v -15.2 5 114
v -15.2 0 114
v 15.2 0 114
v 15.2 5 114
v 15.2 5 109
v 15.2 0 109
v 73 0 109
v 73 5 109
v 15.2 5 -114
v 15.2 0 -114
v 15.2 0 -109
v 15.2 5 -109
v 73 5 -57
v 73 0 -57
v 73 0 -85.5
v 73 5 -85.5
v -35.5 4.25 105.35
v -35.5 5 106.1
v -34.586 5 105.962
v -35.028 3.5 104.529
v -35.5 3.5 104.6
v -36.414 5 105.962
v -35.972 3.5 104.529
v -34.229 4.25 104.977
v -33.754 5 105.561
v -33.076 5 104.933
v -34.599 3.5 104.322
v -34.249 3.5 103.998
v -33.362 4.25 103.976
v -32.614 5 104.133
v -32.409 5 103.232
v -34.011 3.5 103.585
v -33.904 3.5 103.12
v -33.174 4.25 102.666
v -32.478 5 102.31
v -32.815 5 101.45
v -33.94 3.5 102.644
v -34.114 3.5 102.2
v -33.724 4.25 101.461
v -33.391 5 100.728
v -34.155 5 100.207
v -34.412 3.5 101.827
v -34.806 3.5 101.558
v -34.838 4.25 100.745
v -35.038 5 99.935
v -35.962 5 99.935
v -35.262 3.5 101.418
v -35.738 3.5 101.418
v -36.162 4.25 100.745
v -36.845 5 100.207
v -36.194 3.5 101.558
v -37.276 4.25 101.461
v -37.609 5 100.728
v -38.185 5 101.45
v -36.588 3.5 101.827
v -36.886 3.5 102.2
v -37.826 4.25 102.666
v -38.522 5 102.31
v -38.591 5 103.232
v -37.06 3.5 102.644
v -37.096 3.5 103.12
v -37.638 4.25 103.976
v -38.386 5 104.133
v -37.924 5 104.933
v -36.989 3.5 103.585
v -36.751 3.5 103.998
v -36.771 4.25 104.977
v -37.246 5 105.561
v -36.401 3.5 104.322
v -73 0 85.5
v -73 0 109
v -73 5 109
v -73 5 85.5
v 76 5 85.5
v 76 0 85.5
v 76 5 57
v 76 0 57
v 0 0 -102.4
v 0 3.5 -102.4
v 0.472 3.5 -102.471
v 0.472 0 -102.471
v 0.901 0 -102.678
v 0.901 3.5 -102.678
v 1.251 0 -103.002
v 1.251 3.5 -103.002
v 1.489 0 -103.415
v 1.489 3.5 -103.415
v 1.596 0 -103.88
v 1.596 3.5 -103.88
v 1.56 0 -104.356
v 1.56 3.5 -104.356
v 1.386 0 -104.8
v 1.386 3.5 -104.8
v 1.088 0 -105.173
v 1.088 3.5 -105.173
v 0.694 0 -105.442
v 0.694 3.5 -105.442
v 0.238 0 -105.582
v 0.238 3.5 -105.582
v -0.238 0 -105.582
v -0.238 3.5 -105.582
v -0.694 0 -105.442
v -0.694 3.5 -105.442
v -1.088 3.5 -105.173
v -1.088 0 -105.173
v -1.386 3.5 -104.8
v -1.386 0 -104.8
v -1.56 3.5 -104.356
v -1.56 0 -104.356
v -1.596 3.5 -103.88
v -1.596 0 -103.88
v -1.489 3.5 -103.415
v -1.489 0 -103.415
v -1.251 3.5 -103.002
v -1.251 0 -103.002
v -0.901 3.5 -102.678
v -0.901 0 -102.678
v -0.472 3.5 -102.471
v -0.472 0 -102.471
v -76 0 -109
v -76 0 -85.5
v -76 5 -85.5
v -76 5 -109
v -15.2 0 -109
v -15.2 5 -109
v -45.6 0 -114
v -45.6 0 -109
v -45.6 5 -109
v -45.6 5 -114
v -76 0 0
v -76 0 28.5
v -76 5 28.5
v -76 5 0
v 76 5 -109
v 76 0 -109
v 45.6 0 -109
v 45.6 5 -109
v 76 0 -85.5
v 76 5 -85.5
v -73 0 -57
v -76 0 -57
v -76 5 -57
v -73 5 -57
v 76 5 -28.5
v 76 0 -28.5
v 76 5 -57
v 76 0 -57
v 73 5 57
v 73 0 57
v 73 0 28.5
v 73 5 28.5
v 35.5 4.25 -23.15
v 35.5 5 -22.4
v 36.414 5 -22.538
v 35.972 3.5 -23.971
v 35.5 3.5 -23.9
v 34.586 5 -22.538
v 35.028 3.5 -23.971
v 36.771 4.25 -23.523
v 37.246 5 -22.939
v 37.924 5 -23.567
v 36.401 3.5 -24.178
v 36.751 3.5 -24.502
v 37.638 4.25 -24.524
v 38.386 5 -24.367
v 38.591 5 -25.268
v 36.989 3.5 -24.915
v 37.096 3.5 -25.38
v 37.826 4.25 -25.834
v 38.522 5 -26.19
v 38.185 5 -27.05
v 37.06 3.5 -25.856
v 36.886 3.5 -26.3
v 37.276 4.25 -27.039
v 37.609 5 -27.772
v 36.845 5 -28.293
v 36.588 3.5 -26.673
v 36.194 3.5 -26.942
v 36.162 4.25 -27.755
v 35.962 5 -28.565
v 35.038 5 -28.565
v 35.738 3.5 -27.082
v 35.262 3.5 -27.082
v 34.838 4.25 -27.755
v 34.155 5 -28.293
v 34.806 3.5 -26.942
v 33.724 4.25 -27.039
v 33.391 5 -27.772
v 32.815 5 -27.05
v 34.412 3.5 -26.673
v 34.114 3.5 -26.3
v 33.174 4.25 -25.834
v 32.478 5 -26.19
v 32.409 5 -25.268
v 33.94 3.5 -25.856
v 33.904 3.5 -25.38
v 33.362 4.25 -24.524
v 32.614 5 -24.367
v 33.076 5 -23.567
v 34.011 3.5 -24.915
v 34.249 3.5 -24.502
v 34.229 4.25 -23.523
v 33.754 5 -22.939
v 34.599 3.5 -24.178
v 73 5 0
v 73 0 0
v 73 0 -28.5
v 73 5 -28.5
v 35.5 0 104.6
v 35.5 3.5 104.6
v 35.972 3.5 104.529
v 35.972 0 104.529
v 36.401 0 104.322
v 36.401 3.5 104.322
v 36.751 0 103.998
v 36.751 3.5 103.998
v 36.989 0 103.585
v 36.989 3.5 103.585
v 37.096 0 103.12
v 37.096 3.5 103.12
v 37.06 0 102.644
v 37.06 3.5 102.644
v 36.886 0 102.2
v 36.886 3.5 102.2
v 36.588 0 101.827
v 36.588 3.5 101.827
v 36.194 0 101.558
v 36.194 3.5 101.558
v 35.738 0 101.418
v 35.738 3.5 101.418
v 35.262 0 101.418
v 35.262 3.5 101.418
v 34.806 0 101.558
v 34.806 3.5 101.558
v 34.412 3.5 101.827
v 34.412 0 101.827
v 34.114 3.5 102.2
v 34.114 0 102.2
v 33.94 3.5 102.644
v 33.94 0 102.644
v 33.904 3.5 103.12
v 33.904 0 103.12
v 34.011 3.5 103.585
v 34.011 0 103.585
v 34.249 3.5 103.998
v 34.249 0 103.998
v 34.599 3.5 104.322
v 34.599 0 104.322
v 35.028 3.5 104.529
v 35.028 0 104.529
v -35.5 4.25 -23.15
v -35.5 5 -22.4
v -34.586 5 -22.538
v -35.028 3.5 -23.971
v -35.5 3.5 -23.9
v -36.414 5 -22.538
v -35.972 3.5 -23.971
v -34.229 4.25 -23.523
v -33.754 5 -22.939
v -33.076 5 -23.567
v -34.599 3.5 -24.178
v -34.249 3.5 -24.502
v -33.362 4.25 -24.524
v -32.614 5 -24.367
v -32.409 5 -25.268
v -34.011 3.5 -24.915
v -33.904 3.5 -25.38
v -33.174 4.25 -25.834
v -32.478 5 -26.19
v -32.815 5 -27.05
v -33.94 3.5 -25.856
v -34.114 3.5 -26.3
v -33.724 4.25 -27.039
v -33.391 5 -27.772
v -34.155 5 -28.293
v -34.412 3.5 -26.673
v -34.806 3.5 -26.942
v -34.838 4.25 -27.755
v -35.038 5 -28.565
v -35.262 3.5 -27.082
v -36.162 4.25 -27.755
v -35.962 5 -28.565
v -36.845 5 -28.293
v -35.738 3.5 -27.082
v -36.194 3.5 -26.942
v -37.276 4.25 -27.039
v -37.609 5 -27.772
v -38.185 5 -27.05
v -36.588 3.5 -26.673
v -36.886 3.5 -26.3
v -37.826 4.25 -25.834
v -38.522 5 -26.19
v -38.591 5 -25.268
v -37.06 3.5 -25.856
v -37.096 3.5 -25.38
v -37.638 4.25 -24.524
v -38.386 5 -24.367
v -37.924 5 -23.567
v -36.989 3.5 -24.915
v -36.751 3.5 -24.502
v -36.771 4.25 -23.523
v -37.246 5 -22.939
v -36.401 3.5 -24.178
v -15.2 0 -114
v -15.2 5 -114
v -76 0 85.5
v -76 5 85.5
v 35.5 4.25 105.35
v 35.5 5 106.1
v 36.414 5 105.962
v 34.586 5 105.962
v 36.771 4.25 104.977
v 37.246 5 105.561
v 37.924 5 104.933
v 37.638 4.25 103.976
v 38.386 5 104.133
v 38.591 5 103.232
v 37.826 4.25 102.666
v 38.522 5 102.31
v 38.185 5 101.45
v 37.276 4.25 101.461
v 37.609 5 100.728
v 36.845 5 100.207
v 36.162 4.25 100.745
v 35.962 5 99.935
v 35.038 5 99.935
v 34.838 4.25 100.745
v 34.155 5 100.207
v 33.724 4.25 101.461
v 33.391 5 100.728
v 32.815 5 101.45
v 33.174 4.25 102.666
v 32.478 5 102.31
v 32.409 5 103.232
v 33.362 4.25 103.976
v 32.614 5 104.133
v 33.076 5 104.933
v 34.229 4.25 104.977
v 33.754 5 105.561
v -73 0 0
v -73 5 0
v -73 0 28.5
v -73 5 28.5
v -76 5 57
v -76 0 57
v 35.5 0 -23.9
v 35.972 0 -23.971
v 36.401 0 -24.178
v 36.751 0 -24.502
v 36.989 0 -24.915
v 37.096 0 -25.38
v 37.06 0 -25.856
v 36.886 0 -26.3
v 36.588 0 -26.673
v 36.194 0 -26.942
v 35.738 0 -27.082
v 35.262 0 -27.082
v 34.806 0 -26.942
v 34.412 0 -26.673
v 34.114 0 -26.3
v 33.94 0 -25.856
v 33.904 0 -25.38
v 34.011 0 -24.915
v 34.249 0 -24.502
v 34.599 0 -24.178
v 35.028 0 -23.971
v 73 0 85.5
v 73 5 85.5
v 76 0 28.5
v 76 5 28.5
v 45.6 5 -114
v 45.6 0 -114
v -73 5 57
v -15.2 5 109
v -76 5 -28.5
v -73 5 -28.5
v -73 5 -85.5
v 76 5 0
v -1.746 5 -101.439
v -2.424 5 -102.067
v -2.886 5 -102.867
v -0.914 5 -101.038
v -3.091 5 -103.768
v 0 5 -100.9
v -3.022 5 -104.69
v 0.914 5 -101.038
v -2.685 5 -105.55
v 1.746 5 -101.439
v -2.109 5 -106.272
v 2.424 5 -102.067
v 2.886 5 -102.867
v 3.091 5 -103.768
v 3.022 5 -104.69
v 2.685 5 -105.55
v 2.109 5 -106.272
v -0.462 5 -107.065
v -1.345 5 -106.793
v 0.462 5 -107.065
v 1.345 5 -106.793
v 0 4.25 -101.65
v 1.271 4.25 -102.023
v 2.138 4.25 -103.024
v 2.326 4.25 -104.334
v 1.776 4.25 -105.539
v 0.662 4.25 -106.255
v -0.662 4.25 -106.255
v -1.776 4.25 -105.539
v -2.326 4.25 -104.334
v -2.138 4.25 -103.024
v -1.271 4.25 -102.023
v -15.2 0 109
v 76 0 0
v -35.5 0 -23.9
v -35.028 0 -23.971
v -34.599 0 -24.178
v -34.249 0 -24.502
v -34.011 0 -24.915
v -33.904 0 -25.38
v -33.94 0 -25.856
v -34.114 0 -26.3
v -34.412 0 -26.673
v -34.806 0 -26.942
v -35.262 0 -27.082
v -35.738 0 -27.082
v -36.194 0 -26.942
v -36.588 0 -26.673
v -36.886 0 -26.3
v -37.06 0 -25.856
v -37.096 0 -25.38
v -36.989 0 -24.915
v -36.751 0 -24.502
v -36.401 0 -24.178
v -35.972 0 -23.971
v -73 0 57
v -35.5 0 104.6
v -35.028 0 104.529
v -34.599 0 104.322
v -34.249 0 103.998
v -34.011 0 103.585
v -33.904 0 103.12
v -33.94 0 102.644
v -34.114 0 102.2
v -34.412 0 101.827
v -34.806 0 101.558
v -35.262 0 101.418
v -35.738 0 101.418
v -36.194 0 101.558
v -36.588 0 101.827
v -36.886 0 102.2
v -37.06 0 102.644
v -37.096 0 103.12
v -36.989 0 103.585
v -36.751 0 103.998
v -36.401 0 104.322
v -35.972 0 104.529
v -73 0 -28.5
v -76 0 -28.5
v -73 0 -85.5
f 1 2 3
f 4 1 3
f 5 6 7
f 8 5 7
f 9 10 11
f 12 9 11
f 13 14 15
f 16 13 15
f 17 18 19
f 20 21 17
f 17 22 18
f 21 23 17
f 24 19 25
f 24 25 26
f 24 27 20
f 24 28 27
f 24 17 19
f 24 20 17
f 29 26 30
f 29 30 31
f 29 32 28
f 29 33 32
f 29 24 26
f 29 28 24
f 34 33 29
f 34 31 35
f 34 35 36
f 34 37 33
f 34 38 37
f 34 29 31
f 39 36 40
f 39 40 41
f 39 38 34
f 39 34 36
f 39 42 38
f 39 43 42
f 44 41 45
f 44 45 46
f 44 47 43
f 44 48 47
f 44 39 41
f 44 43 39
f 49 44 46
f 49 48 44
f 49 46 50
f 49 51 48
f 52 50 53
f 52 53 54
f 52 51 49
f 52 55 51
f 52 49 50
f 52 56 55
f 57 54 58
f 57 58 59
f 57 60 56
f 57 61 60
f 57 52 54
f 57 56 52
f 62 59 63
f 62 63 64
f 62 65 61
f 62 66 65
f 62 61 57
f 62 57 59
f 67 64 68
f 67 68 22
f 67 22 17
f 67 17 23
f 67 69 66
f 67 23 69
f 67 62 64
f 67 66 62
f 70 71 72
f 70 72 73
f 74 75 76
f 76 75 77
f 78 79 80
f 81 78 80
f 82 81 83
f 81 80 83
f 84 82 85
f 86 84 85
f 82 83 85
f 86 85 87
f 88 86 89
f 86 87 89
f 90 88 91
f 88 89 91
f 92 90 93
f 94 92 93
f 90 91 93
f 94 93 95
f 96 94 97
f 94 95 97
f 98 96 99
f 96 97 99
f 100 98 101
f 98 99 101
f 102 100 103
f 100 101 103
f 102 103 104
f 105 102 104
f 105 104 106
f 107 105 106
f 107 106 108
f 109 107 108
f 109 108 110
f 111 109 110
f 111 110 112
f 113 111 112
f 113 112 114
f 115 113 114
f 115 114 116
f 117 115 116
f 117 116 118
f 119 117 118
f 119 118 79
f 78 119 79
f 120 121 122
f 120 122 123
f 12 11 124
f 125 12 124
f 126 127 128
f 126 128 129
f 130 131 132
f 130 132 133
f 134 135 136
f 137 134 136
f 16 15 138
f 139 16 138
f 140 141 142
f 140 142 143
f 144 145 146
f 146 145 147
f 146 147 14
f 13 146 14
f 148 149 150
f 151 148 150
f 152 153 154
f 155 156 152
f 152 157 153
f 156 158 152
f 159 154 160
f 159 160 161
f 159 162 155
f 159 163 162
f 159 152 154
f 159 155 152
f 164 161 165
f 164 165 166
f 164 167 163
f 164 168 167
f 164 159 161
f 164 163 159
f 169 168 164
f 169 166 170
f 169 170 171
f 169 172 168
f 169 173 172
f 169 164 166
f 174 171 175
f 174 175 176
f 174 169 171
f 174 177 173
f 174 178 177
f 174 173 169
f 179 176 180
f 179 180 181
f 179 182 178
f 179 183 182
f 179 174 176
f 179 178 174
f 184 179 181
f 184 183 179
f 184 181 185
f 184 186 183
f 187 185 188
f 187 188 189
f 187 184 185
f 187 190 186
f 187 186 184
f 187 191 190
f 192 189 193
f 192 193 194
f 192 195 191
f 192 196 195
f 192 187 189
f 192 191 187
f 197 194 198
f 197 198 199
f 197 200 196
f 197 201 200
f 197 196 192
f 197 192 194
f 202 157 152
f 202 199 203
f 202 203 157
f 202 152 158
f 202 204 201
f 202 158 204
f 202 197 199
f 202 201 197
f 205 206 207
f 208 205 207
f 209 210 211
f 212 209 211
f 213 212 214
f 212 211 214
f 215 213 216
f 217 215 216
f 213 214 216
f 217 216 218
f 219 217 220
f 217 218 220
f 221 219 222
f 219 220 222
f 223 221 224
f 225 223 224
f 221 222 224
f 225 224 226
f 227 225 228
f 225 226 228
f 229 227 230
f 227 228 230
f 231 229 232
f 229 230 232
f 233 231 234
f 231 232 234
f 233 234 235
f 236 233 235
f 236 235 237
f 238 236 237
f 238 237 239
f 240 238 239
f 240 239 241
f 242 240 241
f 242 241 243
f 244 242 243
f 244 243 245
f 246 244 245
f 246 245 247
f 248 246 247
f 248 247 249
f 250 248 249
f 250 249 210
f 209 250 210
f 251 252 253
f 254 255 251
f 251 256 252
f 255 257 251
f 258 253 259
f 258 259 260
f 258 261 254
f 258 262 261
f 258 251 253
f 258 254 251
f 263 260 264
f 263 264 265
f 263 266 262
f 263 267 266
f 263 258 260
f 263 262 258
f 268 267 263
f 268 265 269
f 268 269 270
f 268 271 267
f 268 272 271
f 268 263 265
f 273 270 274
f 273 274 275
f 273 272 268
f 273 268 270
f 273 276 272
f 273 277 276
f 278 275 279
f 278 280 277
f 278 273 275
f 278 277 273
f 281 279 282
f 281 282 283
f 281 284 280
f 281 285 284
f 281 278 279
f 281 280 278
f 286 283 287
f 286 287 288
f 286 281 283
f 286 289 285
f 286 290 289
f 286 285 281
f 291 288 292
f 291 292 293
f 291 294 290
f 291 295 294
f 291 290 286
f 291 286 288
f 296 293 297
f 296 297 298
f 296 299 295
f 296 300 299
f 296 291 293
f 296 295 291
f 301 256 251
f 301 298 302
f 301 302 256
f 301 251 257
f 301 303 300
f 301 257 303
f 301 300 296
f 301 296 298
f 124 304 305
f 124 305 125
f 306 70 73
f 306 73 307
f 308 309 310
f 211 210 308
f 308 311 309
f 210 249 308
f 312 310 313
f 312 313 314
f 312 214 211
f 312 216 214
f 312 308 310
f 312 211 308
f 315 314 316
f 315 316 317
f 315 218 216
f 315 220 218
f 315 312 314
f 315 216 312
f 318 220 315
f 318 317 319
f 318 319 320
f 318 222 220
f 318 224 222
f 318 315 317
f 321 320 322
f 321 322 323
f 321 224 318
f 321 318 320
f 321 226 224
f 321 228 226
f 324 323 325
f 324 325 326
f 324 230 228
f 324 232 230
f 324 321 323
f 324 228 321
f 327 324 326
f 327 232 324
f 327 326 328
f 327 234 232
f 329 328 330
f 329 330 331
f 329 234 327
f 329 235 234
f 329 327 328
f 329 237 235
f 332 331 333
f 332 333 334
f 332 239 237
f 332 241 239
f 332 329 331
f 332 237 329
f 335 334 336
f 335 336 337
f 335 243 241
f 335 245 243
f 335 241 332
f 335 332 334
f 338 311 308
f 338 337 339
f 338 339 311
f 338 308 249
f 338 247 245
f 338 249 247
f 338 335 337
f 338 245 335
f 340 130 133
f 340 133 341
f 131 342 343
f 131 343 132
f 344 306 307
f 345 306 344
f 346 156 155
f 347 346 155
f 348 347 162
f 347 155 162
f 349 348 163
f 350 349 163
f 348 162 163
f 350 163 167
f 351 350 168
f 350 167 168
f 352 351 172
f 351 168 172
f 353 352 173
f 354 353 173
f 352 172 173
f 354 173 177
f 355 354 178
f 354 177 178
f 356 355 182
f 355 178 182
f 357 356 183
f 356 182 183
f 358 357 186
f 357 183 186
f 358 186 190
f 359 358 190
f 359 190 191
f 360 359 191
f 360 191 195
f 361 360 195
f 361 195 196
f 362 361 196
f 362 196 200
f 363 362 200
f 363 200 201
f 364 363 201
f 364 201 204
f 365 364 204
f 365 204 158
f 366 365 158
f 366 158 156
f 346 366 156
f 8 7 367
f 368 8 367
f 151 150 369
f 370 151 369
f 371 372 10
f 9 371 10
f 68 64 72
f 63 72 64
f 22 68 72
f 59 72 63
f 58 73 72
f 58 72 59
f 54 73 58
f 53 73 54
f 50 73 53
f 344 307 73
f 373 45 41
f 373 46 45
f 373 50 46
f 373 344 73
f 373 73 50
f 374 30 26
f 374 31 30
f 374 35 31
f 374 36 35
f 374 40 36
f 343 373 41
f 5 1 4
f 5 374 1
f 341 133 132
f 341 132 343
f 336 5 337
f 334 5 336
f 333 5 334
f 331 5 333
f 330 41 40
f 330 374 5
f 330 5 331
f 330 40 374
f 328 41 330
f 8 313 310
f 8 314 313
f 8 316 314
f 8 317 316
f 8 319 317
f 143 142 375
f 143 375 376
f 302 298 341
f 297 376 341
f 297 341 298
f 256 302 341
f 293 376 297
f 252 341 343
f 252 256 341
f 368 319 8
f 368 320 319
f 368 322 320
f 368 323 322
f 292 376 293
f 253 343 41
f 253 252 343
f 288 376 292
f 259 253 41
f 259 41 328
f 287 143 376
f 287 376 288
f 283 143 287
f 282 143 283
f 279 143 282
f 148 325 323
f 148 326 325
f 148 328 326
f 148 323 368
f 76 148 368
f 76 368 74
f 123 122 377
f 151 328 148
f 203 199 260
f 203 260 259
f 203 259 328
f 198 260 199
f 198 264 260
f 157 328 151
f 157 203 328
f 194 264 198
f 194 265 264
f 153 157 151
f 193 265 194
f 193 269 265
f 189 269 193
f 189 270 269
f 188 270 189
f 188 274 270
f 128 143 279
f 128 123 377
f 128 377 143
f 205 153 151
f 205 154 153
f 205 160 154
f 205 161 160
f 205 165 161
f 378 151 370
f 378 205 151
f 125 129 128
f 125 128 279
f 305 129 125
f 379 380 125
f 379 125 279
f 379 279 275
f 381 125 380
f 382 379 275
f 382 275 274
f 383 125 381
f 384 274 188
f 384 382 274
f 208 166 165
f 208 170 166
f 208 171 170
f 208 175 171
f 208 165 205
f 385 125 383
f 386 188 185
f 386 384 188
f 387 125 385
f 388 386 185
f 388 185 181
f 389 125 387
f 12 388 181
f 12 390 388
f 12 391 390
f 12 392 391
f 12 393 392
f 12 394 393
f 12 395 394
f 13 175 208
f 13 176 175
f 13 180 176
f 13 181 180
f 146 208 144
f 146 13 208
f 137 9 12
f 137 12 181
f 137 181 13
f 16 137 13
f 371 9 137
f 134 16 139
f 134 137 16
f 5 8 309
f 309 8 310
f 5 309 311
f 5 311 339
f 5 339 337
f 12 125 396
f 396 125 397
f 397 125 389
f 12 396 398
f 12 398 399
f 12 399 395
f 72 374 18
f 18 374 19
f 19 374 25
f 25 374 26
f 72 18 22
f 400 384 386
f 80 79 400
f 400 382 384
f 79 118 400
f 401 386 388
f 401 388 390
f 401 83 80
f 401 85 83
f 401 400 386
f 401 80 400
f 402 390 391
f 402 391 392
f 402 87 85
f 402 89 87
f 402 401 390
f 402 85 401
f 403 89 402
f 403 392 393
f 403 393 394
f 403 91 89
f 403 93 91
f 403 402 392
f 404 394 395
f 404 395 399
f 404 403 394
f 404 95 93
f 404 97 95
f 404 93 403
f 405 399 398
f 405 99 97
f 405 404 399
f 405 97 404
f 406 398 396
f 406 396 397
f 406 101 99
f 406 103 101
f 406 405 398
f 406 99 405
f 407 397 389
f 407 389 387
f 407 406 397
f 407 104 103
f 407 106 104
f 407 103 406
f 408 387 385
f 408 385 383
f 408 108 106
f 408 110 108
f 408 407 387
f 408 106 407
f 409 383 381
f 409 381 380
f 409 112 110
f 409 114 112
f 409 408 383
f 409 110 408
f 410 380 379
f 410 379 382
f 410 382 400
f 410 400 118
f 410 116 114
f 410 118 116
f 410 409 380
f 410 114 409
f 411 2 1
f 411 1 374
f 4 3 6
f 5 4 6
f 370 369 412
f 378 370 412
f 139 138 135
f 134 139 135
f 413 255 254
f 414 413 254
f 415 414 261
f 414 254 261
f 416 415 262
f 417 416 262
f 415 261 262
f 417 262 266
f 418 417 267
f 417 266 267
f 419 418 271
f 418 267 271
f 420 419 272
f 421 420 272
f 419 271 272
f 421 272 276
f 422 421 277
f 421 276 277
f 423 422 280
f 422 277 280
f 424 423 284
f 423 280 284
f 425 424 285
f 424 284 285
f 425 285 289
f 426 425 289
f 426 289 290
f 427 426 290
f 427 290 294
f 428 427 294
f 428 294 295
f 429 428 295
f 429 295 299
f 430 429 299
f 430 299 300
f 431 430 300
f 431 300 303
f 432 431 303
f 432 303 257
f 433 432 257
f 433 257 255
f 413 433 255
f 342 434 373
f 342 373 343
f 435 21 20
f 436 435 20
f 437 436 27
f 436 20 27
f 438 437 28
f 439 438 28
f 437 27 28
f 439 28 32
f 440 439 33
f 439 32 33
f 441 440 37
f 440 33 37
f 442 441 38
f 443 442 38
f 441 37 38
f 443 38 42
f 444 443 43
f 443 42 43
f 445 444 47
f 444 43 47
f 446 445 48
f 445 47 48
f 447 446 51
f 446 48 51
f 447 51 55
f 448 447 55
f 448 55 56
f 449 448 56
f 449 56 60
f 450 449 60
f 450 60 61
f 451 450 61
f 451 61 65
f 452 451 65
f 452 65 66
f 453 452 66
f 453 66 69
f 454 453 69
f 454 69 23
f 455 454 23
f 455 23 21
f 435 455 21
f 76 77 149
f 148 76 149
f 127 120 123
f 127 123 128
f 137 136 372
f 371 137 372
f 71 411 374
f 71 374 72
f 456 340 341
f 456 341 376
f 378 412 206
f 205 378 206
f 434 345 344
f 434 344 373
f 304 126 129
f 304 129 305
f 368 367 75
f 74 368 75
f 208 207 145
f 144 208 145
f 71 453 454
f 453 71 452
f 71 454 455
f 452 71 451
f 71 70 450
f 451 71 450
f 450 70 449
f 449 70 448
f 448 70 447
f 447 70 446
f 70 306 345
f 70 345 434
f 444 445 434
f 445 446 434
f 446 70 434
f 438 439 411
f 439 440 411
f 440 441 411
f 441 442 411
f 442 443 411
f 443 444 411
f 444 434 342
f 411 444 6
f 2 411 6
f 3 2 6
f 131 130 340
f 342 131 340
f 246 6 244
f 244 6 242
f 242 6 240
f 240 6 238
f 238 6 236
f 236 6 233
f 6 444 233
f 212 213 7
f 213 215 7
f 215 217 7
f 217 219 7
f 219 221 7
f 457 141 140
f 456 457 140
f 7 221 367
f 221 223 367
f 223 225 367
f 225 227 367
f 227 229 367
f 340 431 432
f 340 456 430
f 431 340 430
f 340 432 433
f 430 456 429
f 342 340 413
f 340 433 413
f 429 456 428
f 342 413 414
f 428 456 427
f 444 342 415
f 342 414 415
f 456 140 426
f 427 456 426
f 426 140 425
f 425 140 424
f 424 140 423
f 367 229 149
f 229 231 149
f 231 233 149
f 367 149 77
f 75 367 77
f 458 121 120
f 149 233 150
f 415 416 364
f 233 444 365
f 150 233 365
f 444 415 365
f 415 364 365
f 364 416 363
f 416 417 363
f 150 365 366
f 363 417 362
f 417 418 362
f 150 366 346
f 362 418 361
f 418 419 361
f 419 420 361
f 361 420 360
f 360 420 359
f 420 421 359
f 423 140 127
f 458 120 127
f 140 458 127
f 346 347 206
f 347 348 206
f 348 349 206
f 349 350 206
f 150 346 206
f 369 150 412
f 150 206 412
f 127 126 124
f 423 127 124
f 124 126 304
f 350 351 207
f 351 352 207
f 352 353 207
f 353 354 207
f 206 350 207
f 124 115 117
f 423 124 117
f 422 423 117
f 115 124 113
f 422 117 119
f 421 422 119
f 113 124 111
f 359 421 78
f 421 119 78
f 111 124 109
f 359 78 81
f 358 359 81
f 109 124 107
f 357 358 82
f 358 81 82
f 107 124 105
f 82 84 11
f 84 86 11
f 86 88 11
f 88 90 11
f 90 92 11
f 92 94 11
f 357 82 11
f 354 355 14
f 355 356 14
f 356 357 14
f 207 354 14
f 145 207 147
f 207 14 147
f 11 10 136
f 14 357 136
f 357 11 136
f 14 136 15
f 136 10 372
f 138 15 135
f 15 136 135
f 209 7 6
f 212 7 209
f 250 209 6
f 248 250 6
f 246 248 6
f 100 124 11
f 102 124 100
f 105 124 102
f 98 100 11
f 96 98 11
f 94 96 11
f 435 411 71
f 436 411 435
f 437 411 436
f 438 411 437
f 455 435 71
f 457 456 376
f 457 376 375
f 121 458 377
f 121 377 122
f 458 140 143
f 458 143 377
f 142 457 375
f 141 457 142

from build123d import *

# Parameters (mm, degrees)
BOSS_EXTRUDE1_DEPTH = 5
SKETCH2_R           = 1.6
CUT_EXTRUDE1_DEPTH  = 138.102151697
CHAMFER1_SIZE       = 1.5


with BuildPart() as part:
    # Sketch1 → Boss-Extrude1 (new body)
    with BuildSketch(Plane(origin=(0, 0, 0), x_dir=(1, 0, 0), z_dir=(0, 1, 0))):
        Polygon((0, -114), (-15.2, -114), (-15.2, -109), (-73, -109), (-73, -85.5), (-76, -85.5), (-76, -57), (-73, -57), (-73, -28.5), (-76, -28.5), (-76, 0), (-73, 0), (-73, 28.5), (-76, 28.5), (-76, 57), (-73, 57), (-73, 85.5), (-76, 85.5), (-76, 109), (-45.6, 109), (-45.6, 114), (-15.2, 114), (-15.2, 109), (0, 109), align=None)
    boss_extrude1 = extrude(amount=BOSS_EXTRUDE1_DEPTH)

    # Mirror1: Boss-Extrude1 across plane
    add(boss_extrude1.mirror(Plane(origin=(0, 5, 0), x_dir=(0, 0, 1), z_dir=(1, 0, 0))))

    # Sketch2 → Cut-Extrude1 (cut, through all)
    with BuildSketch(Plane(origin=(0, 5, 0), x_dir=(1, 0, 0), z_dir=(0, 1, 0))):
        with Locations(Location((0, 104, 0), (0, 0, 270))):
            Circle(SKETCH2_R)
        with Locations(Location((-35.5, 25.5, 0), (0, 0, 270))):
            Circle(SKETCH2_R)
        with Locations(Location((35.5, 25.5, 0), (0, 0, 270))):
            Circle(SKETCH2_R)
        with Locations(Location((-35.5, -103, 0), (0, 0, 270))):
            Circle(SKETCH2_R)
        with Locations(Location((35.5, -103, 0), (0, 0, 270))):
            Circle(SKETCH2_R)
    extrude(amount=-CUT_EXTRUDE1_DEPTH, mode=Mode.SUBTRACT)

    # Chamfer1
    chamfer1_edges = [part.edges().sort_by_distance(p)[0] for p in [
        (0, 5, -105.6),
        (35.5, 5, -27.1),
        (-35.5, 5, -27.1),
        (-35.5, 5, 101.4),
        (35.5, 5, 101.4),
    ]]
    chamfer(chamfer1_edges, length=CHAMFER1_SIZE)


solid = part.part
